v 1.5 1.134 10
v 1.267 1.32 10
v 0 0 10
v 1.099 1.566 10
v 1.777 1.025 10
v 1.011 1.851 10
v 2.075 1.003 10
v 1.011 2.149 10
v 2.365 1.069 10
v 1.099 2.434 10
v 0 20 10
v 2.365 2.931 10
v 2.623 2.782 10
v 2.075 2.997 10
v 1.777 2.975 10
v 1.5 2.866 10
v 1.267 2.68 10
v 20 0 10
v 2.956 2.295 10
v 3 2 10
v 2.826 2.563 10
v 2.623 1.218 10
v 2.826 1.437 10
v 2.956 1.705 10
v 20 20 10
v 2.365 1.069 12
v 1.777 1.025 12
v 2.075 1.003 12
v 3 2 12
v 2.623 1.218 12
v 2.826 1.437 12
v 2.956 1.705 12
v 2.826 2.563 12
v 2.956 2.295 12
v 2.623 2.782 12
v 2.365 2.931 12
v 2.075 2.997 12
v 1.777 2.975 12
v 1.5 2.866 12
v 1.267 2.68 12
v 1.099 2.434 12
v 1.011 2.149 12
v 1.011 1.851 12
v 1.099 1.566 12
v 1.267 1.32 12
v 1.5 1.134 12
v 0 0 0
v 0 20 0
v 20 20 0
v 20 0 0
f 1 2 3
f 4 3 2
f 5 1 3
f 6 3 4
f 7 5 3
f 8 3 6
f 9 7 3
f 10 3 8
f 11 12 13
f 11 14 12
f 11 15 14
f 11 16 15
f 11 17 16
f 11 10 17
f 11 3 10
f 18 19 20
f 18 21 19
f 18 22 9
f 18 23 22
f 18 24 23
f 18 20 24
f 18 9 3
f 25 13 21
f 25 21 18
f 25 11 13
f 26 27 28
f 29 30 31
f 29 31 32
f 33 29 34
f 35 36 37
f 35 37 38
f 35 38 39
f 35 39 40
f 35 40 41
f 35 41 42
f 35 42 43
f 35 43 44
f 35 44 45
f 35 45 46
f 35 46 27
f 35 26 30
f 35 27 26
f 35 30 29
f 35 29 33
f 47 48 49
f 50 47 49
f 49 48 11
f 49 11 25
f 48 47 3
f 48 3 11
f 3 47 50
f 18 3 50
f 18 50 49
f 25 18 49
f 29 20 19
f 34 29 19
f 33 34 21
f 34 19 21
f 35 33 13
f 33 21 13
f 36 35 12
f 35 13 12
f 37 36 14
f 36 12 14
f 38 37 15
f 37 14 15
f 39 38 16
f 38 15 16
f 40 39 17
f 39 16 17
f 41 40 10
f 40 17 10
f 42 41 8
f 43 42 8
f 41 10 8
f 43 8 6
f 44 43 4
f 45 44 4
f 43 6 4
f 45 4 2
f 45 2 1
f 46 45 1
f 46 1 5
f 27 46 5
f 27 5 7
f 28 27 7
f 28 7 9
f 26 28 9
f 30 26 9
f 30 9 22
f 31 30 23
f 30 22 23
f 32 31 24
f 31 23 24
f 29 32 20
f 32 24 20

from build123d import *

# Parameters (mm, degrees)
SKETCH_1_W     = 20
SKETCH_1_H     = 20
BASEBOX_DEPTH  = 10
SKETCH_2_R     = 1
BOSSSEED_DEPTH = 2


with BuildPart() as part:
    # 草图1 → BaseBox (new body)
    with BuildSketch(Plane.XY):
        with Locations((10, 10)):
            Rectangle(SKETCH_1_W, SKETCH_1_H)
    extrude(amount=BASEBOX_DEPTH)

    # 草图2 → BossSeed (add)
    with BuildSketch(Plane.XY.offset(10)):
        with Locations((2, 2)):
            Circle(SKETCH_2_R)
    extrude(amount=BOSSSEED_DEPTH)


solid = part.part
